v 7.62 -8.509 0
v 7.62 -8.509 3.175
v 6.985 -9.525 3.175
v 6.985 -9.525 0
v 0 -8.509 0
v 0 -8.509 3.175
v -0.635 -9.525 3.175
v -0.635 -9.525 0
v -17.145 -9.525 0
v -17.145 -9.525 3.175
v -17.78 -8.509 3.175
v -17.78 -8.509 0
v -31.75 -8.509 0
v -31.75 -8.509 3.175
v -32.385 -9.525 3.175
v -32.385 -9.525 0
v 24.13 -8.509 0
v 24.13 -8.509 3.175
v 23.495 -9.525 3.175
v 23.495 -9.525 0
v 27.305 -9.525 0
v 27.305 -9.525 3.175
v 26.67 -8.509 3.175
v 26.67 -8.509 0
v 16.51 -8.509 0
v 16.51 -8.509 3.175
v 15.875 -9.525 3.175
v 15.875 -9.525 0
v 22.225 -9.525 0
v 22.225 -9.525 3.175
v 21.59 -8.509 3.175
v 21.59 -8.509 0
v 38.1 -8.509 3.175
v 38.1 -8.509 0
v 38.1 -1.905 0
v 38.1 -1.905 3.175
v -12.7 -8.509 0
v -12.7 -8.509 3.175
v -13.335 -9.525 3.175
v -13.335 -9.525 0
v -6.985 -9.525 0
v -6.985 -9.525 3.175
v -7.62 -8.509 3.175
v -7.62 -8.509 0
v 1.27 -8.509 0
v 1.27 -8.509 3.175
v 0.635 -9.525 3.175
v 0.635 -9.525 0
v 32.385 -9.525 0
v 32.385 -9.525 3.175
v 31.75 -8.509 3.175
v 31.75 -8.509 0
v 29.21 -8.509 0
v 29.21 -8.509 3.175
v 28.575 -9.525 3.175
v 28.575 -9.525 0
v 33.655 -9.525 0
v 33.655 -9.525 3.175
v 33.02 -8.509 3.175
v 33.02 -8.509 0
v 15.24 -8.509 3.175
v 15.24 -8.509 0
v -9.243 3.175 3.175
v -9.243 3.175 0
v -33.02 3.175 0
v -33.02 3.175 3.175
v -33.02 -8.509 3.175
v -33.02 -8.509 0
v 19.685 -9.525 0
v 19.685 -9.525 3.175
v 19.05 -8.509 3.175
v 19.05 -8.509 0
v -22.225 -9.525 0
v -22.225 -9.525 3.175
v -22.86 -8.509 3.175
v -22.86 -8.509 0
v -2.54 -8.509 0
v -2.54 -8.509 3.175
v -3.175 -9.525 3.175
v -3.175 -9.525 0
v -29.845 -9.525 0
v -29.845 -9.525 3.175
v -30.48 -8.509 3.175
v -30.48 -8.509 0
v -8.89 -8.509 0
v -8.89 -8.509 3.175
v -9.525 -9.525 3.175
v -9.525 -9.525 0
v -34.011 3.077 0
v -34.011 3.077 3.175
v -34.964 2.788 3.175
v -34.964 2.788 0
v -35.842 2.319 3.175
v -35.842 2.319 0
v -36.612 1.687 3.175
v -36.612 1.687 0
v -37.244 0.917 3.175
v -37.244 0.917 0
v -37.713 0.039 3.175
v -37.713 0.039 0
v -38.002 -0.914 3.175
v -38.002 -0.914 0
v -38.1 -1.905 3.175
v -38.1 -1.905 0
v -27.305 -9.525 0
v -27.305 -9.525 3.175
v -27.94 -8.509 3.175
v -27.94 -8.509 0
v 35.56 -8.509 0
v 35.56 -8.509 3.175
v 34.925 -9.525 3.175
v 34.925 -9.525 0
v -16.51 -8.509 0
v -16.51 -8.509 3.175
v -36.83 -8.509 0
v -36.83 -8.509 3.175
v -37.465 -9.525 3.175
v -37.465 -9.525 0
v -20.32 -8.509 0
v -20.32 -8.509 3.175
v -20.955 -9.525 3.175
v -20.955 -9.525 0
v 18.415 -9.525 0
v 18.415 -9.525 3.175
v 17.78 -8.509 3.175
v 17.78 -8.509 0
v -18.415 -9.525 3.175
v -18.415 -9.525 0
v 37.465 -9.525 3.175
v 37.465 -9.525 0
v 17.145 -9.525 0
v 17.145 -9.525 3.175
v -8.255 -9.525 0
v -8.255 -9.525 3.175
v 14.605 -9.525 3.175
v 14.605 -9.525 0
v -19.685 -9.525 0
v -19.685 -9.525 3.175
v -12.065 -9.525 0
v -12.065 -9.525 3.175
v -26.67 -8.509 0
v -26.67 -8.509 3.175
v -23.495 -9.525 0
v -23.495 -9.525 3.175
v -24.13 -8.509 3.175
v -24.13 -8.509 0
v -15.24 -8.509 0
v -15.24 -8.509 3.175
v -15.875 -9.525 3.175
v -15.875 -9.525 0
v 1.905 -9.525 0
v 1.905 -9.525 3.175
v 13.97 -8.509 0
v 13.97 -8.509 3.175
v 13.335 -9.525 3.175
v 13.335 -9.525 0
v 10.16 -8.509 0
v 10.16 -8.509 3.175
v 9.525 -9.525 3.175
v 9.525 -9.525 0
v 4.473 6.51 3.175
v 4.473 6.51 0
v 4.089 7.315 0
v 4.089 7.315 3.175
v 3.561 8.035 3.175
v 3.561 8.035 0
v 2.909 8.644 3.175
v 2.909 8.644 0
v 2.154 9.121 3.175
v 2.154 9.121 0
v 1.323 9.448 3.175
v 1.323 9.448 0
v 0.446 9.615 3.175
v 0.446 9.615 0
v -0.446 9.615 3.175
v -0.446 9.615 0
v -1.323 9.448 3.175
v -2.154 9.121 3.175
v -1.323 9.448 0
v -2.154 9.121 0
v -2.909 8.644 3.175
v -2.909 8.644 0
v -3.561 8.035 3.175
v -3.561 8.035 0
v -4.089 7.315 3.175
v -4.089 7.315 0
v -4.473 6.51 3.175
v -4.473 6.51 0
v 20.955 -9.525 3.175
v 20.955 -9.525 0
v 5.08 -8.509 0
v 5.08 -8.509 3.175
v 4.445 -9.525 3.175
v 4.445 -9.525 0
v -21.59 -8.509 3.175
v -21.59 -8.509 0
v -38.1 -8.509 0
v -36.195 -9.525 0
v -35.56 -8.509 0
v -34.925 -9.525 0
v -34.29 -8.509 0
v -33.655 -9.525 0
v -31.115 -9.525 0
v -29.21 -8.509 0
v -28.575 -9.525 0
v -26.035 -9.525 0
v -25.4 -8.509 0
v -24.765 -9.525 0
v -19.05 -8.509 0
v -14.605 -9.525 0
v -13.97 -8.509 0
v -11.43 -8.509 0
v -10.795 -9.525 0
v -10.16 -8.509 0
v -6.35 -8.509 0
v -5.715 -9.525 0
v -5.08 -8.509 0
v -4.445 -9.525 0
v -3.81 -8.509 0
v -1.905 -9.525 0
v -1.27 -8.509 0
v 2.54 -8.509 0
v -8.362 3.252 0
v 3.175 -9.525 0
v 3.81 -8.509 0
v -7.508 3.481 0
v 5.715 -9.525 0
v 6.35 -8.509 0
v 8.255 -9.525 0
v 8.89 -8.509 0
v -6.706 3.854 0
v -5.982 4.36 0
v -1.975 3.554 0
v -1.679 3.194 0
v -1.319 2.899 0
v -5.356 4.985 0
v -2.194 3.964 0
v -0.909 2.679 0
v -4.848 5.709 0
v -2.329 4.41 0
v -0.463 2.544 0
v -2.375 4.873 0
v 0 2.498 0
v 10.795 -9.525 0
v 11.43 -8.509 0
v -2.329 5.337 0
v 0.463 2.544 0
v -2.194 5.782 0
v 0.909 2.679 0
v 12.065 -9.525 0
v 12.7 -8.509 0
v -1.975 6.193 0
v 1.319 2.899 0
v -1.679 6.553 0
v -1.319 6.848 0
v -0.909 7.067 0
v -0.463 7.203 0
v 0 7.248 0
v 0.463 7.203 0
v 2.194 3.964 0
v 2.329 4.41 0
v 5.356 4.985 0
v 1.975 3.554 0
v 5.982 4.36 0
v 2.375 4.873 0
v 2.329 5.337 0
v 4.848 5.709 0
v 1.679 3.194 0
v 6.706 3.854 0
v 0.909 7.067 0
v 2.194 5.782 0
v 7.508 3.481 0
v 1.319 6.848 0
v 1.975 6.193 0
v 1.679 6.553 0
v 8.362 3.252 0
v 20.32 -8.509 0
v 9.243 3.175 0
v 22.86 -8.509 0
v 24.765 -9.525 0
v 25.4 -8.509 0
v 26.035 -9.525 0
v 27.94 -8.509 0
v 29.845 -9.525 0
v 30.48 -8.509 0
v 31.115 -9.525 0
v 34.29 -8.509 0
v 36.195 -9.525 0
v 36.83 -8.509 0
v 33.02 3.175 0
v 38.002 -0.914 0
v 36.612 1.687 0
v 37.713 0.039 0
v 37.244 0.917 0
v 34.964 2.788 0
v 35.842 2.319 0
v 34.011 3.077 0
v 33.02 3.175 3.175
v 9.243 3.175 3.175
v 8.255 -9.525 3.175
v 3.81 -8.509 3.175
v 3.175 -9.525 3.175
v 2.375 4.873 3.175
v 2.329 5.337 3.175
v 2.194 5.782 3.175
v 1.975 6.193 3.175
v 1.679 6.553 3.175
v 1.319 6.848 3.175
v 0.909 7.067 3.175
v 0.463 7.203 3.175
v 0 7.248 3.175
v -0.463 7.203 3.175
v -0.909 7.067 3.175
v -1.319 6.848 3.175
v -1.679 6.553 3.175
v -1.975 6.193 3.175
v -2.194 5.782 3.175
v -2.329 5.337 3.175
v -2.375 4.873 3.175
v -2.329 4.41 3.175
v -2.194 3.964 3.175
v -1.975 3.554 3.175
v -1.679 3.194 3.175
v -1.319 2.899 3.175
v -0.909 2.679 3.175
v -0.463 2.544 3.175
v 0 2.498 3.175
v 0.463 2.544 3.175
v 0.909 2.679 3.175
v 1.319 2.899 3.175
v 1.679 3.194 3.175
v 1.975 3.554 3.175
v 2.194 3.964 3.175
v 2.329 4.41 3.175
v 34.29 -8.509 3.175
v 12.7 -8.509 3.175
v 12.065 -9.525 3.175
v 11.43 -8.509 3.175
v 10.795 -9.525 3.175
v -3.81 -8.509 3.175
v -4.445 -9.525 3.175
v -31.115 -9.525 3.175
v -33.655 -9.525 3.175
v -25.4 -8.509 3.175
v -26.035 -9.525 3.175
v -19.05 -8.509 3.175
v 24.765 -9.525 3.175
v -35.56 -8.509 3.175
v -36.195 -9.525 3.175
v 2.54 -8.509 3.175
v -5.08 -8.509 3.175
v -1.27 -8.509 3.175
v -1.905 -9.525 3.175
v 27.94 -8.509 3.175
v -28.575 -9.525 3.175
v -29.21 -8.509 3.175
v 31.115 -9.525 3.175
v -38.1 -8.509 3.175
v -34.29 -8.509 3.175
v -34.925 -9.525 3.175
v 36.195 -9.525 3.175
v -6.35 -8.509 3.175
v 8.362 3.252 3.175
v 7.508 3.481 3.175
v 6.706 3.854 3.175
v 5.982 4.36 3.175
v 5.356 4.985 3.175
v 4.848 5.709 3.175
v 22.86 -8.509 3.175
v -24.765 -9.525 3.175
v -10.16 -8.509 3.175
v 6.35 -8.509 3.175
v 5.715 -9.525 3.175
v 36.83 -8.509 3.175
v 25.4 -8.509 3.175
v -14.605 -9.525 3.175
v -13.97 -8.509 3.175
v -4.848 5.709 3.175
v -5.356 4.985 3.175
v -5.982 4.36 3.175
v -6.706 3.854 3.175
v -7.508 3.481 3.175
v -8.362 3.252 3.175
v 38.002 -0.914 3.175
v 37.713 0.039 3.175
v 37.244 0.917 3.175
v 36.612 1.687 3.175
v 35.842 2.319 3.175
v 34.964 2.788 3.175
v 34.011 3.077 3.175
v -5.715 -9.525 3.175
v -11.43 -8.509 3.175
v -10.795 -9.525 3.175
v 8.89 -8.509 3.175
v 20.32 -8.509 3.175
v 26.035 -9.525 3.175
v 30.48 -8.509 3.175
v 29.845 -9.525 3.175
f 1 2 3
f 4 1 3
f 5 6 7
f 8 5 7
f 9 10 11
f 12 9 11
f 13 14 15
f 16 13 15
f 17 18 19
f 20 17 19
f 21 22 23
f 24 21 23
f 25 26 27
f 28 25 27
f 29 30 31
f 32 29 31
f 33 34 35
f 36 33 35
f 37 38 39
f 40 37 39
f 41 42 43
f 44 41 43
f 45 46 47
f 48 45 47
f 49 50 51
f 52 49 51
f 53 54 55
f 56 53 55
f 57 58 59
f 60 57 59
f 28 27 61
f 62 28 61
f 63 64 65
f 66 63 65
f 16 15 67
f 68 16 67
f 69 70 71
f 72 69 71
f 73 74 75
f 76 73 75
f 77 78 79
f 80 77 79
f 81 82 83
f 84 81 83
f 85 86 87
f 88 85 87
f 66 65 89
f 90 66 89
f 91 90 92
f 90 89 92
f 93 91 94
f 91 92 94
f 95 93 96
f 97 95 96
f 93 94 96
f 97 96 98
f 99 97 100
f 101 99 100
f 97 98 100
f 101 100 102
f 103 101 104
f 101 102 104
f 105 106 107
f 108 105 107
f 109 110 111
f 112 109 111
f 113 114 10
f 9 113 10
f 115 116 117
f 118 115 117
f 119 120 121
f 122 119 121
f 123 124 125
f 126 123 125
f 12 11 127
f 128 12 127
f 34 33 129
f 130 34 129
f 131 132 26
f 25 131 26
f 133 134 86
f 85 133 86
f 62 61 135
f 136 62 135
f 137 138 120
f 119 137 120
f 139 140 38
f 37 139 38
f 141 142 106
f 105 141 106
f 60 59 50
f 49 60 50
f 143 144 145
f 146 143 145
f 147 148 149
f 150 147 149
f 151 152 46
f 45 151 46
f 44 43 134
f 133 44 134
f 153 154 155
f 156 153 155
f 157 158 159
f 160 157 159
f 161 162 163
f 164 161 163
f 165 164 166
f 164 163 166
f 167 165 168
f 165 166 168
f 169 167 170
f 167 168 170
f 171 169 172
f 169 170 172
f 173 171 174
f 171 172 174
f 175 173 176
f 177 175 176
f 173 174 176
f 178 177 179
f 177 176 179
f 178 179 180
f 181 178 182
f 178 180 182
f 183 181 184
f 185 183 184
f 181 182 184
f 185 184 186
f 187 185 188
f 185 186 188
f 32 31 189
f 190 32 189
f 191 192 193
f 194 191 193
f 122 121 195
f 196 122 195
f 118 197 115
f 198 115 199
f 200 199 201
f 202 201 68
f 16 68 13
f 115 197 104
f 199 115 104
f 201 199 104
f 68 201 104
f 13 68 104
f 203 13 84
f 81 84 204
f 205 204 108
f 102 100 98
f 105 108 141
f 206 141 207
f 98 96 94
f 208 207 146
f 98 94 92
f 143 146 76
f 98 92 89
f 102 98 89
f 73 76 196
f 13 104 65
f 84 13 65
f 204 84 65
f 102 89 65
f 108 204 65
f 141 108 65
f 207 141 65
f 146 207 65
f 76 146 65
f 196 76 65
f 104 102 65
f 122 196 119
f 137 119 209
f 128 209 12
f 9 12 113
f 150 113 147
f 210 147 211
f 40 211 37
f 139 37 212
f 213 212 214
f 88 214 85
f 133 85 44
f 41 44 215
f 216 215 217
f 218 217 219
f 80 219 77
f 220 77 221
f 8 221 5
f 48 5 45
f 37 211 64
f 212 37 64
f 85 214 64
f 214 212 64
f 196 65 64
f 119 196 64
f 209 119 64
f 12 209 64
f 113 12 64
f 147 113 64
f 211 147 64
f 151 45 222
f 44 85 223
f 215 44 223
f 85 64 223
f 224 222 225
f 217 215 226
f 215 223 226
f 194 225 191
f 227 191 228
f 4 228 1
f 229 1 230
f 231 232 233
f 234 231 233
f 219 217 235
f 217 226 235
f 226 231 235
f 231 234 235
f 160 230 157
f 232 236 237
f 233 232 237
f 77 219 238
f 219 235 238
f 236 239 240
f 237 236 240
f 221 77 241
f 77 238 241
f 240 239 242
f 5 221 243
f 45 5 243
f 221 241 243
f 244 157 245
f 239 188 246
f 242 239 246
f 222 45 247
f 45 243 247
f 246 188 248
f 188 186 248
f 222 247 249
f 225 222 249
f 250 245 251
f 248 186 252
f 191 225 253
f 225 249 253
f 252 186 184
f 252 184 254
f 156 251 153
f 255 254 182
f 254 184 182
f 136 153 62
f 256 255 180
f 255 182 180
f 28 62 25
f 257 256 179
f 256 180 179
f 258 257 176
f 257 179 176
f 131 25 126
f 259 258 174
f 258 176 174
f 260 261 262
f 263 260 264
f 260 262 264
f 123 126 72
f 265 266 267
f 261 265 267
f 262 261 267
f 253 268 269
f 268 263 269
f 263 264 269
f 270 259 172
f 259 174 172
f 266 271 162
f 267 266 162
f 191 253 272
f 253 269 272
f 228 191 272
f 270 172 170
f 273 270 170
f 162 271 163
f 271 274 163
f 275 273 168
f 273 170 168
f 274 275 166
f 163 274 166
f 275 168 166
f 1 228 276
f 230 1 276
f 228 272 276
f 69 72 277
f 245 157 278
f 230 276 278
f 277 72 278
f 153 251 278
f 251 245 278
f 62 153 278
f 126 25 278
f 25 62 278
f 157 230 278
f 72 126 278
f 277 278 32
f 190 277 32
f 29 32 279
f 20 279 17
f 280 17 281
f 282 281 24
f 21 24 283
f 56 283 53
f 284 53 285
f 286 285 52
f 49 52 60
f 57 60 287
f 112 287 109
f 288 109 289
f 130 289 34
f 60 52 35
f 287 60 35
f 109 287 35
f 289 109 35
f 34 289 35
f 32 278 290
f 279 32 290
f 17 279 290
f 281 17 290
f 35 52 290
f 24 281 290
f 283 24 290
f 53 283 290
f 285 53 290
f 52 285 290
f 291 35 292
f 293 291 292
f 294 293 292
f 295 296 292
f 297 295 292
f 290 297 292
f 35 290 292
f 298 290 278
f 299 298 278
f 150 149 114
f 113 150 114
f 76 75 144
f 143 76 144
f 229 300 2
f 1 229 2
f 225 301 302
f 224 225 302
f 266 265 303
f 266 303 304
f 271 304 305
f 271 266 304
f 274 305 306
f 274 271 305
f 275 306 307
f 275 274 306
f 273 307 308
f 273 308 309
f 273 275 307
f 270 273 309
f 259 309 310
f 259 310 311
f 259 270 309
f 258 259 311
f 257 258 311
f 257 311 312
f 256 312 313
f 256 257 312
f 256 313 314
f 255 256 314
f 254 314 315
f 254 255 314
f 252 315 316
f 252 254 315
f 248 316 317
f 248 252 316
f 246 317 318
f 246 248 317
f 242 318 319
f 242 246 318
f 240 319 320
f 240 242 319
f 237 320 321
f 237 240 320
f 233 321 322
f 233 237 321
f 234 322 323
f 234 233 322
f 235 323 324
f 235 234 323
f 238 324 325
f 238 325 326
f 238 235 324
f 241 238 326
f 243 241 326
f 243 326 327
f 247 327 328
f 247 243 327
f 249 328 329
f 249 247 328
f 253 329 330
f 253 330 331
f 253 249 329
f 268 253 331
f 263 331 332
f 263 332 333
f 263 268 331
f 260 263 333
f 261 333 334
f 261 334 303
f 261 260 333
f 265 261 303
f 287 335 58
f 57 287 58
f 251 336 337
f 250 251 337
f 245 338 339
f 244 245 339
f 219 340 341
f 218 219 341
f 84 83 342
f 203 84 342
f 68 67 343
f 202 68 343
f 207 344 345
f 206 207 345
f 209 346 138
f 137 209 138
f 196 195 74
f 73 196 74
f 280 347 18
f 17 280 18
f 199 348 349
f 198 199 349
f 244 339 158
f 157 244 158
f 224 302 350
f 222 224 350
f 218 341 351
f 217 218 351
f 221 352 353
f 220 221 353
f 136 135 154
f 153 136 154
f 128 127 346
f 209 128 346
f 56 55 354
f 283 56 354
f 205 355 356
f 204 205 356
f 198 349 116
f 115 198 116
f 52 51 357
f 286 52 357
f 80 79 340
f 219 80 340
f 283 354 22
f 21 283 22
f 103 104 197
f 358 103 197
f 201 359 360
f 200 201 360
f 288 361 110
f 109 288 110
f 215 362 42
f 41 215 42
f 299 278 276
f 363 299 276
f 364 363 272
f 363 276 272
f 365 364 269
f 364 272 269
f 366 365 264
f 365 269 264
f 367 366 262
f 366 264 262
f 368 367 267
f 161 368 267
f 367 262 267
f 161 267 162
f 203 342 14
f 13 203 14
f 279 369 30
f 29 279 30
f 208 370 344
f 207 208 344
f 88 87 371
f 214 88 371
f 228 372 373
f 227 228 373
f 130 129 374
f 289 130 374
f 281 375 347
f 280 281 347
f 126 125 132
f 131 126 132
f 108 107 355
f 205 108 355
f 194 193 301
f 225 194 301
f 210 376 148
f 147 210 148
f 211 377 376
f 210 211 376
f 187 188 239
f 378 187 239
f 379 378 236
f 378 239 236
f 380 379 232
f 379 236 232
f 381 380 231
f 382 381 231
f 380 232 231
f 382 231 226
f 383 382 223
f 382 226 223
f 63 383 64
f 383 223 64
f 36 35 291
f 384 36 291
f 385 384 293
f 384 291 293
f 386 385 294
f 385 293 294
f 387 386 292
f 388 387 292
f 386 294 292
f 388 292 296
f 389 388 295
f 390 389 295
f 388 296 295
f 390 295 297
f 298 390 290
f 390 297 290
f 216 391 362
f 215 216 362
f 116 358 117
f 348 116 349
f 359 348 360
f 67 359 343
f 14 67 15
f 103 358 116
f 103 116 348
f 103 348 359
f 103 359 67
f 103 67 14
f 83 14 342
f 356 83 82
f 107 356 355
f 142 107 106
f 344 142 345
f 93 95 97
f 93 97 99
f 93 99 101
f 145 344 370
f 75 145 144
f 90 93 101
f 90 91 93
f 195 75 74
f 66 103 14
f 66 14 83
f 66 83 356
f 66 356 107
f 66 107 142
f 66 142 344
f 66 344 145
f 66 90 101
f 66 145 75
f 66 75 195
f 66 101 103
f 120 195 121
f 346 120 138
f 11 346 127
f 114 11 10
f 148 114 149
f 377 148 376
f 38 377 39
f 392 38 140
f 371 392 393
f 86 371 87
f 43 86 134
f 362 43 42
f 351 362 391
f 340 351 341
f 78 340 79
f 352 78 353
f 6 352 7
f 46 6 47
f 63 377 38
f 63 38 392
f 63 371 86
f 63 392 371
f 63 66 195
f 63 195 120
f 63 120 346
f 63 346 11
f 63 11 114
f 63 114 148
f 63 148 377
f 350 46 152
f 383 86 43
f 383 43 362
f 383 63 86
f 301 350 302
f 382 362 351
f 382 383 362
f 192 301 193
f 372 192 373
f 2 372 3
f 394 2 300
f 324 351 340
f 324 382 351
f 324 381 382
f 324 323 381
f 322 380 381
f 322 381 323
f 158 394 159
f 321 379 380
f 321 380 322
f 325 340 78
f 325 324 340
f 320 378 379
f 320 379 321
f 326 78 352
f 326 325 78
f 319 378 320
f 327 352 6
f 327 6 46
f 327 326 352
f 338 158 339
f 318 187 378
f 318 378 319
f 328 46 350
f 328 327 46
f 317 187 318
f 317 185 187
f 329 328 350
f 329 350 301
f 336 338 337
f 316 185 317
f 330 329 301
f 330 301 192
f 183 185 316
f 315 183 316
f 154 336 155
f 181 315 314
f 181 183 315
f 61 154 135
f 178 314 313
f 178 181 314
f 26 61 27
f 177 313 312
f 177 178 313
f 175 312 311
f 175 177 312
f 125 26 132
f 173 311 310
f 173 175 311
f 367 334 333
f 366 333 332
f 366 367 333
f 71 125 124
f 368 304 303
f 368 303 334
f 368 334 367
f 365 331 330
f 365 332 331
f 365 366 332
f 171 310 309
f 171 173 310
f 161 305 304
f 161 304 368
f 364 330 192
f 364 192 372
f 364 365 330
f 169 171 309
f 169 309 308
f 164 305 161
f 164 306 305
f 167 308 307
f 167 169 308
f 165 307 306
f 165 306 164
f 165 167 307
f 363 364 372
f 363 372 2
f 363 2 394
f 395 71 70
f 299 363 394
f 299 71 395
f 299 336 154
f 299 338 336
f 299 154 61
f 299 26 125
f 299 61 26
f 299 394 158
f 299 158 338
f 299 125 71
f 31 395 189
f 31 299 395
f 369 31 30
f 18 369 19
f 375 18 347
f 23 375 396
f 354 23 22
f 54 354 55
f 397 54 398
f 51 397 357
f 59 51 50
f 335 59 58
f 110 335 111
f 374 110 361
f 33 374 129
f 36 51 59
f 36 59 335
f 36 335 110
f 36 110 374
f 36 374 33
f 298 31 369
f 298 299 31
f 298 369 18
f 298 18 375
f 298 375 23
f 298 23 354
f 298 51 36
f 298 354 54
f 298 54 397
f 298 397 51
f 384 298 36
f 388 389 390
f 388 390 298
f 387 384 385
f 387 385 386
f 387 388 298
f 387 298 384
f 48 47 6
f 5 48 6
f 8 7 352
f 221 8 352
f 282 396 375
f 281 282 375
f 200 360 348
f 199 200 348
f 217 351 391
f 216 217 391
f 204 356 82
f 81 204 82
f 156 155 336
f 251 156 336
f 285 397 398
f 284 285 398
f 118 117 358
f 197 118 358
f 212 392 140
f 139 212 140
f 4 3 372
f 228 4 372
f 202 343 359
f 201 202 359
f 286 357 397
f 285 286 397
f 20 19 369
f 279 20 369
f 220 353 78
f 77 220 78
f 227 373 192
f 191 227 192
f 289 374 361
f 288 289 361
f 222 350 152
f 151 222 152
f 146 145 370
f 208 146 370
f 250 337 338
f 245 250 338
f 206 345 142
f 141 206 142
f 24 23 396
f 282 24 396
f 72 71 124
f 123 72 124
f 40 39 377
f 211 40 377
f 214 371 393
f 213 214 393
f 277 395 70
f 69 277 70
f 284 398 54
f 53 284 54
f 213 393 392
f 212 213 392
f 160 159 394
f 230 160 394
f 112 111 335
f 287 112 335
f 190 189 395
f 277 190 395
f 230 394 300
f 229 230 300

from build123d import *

# Parameters (mm, degrees)
F0_R     = 2.3749
F1_DEPTH = 3.175
F3_DEPTH = 25.4


with BuildPart() as f1:
    # F0 (on Top) → F1 (new body)
    with BuildSketch(Plane.XY):
        with BuildLine():
            Line((-38.1, -9.525), (38.1, -9.525))
            Line((38.1, -9.525), (38.1, -1.905))
            ThreePointArc((38.1, -1.905), (36.612102, 1.687102), (33.02, 3.175))
            Line((33.02, 3.175), (9.243306, 3.175))
            ThreePointArc((9.243306, 3.175), (6.333003, 4.091283), (4.472567, 6.509591))
            ThreePointArc((4.472567, 6.509591), (0, 9.635769), (-4.472567, 6.509591))
            ThreePointArc((-4.472567, 6.509591), (-6.333003, 4.091283), (-9.243306, 3.175))
            Line((-9.243306, 3.175), (-33.02, 3.175))
            ThreePointArc((-33.02, 3.175), (-36.612102, 1.687102), (-38.1, -1.905))
            Line((-38.1, -1.905), (-38.1, -9.525))
        make_face()
        with Locations((0, 4.873269)):
            Circle(F0_R, mode=Mode.SUBTRACT)
    extrude(amount=F1_DEPTH)

    # F2 (on face) → F3 (cut)
    with BuildSketch(Plane.XY.offset(3.175)):
        Polygon((-37.465, -9.525), (-38.1, -8.509), (-38.1, -14.148636), (38.1, -14.148636), (38.1, -8.509), (37.465, -9.525), (36.83, -8.509), (36.195, -9.525), (35.56, -8.509), (34.925, -9.525), (34.29, -8.509), (33.655, -9.525), (33.02, -8.509), (32.385, -9.525), (31.75, -8.509), (31.115, -9.525), (30.48, -8.509), (29.845, -9.525), (29.21, -8.509), (28.575, -9.525), (27.94, -8.509), (27.305, -9.525), (26.67, -8.509), (26.035, -9.525), (25.4, -8.509), (24.765, -9.525), (24.13, -8.509), (23.495, -9.525), (22.86, -8.509), (22.225, -9.525), (21.59, -8.509), (20.955, -9.525), (20.32, -8.509), (19.685, -9.525), (19.05, -8.509), (18.415, -9.525), (17.78, -8.509), (17.145, -9.525), (16.51, -8.509), (15.875, -9.525), (15.24, -8.509), (14.605, -9.525), (13.97, -8.509), (13.335, -9.525), (12.7, -8.509), (12.065, -9.525), (11.43, -8.509), (10.795, -9.525), (10.16, -8.509), (9.525, -9.525), (8.89, -8.509), (8.255, -9.525), (7.62, -8.509), (6.985, -9.525), (6.35, -8.509), (5.715, -9.525), (5.08, -8.509), (4.445, -9.525), (3.81, -8.509), (3.175, -9.525), (2.54, -8.509), (1.905, -9.525), (1.27, -8.509), (0.635, -9.525), (0, -8.509), (-0.635, -9.525), (-1.27, -8.509), (-1.905, -9.525), (-2.54, -8.509), (-3.175, -9.525), (-3.81, -8.509), (-4.445, -9.525), (-5.08, -8.509), (-5.715, -9.525), (-6.35, -8.509), (-6.985, -9.525), (-7.62, -8.509), (-8.255, -9.525), (-8.89, -8.509), (-9.525, -9.525), (-10.16, -8.509), (-10.795, -9.525), (-11.43, -8.509), (-12.065, -9.525), (-12.7, -8.509), (-13.335, -9.525), (-13.97, -8.509), (-14.605, -9.525), (-15.24, -8.509), (-15.875, -9.525), (-16.51, -8.509), (-17.145, -9.525), (-17.78, -8.509), (-18.415, -9.525), (-19.05, -8.509), (-19.685, -9.525), (-20.32, -8.509), (-20.955, -9.525), (-21.59, -8.509), (-22.225, -9.525), (-22.86, -8.509), (-23.495, -9.525), (-24.13, -8.509), (-24.765, -9.525), (-25.4, -8.509), (-26.035, -9.525), (-26.67, -8.509), (-27.305, -9.525), (-27.94, -8.509), (-28.575, -9.525), (-29.21, -8.509), (-29.845, -9.525), (-30.48, -8.509), (-31.115, -9.525), (-31.75, -8.509), (-32.385, -9.525), (-33.02, -8.509), (-33.655, -9.525), (-34.29, -8.509), (-34.925, -9.525), (-35.56, -8.509), (-36.195, -9.525), (-36.83, -8.509), align=None)
    extrude(amount=-F3_DEPTH, mode=Mode.SUBTRACT)


solid = f1.part
